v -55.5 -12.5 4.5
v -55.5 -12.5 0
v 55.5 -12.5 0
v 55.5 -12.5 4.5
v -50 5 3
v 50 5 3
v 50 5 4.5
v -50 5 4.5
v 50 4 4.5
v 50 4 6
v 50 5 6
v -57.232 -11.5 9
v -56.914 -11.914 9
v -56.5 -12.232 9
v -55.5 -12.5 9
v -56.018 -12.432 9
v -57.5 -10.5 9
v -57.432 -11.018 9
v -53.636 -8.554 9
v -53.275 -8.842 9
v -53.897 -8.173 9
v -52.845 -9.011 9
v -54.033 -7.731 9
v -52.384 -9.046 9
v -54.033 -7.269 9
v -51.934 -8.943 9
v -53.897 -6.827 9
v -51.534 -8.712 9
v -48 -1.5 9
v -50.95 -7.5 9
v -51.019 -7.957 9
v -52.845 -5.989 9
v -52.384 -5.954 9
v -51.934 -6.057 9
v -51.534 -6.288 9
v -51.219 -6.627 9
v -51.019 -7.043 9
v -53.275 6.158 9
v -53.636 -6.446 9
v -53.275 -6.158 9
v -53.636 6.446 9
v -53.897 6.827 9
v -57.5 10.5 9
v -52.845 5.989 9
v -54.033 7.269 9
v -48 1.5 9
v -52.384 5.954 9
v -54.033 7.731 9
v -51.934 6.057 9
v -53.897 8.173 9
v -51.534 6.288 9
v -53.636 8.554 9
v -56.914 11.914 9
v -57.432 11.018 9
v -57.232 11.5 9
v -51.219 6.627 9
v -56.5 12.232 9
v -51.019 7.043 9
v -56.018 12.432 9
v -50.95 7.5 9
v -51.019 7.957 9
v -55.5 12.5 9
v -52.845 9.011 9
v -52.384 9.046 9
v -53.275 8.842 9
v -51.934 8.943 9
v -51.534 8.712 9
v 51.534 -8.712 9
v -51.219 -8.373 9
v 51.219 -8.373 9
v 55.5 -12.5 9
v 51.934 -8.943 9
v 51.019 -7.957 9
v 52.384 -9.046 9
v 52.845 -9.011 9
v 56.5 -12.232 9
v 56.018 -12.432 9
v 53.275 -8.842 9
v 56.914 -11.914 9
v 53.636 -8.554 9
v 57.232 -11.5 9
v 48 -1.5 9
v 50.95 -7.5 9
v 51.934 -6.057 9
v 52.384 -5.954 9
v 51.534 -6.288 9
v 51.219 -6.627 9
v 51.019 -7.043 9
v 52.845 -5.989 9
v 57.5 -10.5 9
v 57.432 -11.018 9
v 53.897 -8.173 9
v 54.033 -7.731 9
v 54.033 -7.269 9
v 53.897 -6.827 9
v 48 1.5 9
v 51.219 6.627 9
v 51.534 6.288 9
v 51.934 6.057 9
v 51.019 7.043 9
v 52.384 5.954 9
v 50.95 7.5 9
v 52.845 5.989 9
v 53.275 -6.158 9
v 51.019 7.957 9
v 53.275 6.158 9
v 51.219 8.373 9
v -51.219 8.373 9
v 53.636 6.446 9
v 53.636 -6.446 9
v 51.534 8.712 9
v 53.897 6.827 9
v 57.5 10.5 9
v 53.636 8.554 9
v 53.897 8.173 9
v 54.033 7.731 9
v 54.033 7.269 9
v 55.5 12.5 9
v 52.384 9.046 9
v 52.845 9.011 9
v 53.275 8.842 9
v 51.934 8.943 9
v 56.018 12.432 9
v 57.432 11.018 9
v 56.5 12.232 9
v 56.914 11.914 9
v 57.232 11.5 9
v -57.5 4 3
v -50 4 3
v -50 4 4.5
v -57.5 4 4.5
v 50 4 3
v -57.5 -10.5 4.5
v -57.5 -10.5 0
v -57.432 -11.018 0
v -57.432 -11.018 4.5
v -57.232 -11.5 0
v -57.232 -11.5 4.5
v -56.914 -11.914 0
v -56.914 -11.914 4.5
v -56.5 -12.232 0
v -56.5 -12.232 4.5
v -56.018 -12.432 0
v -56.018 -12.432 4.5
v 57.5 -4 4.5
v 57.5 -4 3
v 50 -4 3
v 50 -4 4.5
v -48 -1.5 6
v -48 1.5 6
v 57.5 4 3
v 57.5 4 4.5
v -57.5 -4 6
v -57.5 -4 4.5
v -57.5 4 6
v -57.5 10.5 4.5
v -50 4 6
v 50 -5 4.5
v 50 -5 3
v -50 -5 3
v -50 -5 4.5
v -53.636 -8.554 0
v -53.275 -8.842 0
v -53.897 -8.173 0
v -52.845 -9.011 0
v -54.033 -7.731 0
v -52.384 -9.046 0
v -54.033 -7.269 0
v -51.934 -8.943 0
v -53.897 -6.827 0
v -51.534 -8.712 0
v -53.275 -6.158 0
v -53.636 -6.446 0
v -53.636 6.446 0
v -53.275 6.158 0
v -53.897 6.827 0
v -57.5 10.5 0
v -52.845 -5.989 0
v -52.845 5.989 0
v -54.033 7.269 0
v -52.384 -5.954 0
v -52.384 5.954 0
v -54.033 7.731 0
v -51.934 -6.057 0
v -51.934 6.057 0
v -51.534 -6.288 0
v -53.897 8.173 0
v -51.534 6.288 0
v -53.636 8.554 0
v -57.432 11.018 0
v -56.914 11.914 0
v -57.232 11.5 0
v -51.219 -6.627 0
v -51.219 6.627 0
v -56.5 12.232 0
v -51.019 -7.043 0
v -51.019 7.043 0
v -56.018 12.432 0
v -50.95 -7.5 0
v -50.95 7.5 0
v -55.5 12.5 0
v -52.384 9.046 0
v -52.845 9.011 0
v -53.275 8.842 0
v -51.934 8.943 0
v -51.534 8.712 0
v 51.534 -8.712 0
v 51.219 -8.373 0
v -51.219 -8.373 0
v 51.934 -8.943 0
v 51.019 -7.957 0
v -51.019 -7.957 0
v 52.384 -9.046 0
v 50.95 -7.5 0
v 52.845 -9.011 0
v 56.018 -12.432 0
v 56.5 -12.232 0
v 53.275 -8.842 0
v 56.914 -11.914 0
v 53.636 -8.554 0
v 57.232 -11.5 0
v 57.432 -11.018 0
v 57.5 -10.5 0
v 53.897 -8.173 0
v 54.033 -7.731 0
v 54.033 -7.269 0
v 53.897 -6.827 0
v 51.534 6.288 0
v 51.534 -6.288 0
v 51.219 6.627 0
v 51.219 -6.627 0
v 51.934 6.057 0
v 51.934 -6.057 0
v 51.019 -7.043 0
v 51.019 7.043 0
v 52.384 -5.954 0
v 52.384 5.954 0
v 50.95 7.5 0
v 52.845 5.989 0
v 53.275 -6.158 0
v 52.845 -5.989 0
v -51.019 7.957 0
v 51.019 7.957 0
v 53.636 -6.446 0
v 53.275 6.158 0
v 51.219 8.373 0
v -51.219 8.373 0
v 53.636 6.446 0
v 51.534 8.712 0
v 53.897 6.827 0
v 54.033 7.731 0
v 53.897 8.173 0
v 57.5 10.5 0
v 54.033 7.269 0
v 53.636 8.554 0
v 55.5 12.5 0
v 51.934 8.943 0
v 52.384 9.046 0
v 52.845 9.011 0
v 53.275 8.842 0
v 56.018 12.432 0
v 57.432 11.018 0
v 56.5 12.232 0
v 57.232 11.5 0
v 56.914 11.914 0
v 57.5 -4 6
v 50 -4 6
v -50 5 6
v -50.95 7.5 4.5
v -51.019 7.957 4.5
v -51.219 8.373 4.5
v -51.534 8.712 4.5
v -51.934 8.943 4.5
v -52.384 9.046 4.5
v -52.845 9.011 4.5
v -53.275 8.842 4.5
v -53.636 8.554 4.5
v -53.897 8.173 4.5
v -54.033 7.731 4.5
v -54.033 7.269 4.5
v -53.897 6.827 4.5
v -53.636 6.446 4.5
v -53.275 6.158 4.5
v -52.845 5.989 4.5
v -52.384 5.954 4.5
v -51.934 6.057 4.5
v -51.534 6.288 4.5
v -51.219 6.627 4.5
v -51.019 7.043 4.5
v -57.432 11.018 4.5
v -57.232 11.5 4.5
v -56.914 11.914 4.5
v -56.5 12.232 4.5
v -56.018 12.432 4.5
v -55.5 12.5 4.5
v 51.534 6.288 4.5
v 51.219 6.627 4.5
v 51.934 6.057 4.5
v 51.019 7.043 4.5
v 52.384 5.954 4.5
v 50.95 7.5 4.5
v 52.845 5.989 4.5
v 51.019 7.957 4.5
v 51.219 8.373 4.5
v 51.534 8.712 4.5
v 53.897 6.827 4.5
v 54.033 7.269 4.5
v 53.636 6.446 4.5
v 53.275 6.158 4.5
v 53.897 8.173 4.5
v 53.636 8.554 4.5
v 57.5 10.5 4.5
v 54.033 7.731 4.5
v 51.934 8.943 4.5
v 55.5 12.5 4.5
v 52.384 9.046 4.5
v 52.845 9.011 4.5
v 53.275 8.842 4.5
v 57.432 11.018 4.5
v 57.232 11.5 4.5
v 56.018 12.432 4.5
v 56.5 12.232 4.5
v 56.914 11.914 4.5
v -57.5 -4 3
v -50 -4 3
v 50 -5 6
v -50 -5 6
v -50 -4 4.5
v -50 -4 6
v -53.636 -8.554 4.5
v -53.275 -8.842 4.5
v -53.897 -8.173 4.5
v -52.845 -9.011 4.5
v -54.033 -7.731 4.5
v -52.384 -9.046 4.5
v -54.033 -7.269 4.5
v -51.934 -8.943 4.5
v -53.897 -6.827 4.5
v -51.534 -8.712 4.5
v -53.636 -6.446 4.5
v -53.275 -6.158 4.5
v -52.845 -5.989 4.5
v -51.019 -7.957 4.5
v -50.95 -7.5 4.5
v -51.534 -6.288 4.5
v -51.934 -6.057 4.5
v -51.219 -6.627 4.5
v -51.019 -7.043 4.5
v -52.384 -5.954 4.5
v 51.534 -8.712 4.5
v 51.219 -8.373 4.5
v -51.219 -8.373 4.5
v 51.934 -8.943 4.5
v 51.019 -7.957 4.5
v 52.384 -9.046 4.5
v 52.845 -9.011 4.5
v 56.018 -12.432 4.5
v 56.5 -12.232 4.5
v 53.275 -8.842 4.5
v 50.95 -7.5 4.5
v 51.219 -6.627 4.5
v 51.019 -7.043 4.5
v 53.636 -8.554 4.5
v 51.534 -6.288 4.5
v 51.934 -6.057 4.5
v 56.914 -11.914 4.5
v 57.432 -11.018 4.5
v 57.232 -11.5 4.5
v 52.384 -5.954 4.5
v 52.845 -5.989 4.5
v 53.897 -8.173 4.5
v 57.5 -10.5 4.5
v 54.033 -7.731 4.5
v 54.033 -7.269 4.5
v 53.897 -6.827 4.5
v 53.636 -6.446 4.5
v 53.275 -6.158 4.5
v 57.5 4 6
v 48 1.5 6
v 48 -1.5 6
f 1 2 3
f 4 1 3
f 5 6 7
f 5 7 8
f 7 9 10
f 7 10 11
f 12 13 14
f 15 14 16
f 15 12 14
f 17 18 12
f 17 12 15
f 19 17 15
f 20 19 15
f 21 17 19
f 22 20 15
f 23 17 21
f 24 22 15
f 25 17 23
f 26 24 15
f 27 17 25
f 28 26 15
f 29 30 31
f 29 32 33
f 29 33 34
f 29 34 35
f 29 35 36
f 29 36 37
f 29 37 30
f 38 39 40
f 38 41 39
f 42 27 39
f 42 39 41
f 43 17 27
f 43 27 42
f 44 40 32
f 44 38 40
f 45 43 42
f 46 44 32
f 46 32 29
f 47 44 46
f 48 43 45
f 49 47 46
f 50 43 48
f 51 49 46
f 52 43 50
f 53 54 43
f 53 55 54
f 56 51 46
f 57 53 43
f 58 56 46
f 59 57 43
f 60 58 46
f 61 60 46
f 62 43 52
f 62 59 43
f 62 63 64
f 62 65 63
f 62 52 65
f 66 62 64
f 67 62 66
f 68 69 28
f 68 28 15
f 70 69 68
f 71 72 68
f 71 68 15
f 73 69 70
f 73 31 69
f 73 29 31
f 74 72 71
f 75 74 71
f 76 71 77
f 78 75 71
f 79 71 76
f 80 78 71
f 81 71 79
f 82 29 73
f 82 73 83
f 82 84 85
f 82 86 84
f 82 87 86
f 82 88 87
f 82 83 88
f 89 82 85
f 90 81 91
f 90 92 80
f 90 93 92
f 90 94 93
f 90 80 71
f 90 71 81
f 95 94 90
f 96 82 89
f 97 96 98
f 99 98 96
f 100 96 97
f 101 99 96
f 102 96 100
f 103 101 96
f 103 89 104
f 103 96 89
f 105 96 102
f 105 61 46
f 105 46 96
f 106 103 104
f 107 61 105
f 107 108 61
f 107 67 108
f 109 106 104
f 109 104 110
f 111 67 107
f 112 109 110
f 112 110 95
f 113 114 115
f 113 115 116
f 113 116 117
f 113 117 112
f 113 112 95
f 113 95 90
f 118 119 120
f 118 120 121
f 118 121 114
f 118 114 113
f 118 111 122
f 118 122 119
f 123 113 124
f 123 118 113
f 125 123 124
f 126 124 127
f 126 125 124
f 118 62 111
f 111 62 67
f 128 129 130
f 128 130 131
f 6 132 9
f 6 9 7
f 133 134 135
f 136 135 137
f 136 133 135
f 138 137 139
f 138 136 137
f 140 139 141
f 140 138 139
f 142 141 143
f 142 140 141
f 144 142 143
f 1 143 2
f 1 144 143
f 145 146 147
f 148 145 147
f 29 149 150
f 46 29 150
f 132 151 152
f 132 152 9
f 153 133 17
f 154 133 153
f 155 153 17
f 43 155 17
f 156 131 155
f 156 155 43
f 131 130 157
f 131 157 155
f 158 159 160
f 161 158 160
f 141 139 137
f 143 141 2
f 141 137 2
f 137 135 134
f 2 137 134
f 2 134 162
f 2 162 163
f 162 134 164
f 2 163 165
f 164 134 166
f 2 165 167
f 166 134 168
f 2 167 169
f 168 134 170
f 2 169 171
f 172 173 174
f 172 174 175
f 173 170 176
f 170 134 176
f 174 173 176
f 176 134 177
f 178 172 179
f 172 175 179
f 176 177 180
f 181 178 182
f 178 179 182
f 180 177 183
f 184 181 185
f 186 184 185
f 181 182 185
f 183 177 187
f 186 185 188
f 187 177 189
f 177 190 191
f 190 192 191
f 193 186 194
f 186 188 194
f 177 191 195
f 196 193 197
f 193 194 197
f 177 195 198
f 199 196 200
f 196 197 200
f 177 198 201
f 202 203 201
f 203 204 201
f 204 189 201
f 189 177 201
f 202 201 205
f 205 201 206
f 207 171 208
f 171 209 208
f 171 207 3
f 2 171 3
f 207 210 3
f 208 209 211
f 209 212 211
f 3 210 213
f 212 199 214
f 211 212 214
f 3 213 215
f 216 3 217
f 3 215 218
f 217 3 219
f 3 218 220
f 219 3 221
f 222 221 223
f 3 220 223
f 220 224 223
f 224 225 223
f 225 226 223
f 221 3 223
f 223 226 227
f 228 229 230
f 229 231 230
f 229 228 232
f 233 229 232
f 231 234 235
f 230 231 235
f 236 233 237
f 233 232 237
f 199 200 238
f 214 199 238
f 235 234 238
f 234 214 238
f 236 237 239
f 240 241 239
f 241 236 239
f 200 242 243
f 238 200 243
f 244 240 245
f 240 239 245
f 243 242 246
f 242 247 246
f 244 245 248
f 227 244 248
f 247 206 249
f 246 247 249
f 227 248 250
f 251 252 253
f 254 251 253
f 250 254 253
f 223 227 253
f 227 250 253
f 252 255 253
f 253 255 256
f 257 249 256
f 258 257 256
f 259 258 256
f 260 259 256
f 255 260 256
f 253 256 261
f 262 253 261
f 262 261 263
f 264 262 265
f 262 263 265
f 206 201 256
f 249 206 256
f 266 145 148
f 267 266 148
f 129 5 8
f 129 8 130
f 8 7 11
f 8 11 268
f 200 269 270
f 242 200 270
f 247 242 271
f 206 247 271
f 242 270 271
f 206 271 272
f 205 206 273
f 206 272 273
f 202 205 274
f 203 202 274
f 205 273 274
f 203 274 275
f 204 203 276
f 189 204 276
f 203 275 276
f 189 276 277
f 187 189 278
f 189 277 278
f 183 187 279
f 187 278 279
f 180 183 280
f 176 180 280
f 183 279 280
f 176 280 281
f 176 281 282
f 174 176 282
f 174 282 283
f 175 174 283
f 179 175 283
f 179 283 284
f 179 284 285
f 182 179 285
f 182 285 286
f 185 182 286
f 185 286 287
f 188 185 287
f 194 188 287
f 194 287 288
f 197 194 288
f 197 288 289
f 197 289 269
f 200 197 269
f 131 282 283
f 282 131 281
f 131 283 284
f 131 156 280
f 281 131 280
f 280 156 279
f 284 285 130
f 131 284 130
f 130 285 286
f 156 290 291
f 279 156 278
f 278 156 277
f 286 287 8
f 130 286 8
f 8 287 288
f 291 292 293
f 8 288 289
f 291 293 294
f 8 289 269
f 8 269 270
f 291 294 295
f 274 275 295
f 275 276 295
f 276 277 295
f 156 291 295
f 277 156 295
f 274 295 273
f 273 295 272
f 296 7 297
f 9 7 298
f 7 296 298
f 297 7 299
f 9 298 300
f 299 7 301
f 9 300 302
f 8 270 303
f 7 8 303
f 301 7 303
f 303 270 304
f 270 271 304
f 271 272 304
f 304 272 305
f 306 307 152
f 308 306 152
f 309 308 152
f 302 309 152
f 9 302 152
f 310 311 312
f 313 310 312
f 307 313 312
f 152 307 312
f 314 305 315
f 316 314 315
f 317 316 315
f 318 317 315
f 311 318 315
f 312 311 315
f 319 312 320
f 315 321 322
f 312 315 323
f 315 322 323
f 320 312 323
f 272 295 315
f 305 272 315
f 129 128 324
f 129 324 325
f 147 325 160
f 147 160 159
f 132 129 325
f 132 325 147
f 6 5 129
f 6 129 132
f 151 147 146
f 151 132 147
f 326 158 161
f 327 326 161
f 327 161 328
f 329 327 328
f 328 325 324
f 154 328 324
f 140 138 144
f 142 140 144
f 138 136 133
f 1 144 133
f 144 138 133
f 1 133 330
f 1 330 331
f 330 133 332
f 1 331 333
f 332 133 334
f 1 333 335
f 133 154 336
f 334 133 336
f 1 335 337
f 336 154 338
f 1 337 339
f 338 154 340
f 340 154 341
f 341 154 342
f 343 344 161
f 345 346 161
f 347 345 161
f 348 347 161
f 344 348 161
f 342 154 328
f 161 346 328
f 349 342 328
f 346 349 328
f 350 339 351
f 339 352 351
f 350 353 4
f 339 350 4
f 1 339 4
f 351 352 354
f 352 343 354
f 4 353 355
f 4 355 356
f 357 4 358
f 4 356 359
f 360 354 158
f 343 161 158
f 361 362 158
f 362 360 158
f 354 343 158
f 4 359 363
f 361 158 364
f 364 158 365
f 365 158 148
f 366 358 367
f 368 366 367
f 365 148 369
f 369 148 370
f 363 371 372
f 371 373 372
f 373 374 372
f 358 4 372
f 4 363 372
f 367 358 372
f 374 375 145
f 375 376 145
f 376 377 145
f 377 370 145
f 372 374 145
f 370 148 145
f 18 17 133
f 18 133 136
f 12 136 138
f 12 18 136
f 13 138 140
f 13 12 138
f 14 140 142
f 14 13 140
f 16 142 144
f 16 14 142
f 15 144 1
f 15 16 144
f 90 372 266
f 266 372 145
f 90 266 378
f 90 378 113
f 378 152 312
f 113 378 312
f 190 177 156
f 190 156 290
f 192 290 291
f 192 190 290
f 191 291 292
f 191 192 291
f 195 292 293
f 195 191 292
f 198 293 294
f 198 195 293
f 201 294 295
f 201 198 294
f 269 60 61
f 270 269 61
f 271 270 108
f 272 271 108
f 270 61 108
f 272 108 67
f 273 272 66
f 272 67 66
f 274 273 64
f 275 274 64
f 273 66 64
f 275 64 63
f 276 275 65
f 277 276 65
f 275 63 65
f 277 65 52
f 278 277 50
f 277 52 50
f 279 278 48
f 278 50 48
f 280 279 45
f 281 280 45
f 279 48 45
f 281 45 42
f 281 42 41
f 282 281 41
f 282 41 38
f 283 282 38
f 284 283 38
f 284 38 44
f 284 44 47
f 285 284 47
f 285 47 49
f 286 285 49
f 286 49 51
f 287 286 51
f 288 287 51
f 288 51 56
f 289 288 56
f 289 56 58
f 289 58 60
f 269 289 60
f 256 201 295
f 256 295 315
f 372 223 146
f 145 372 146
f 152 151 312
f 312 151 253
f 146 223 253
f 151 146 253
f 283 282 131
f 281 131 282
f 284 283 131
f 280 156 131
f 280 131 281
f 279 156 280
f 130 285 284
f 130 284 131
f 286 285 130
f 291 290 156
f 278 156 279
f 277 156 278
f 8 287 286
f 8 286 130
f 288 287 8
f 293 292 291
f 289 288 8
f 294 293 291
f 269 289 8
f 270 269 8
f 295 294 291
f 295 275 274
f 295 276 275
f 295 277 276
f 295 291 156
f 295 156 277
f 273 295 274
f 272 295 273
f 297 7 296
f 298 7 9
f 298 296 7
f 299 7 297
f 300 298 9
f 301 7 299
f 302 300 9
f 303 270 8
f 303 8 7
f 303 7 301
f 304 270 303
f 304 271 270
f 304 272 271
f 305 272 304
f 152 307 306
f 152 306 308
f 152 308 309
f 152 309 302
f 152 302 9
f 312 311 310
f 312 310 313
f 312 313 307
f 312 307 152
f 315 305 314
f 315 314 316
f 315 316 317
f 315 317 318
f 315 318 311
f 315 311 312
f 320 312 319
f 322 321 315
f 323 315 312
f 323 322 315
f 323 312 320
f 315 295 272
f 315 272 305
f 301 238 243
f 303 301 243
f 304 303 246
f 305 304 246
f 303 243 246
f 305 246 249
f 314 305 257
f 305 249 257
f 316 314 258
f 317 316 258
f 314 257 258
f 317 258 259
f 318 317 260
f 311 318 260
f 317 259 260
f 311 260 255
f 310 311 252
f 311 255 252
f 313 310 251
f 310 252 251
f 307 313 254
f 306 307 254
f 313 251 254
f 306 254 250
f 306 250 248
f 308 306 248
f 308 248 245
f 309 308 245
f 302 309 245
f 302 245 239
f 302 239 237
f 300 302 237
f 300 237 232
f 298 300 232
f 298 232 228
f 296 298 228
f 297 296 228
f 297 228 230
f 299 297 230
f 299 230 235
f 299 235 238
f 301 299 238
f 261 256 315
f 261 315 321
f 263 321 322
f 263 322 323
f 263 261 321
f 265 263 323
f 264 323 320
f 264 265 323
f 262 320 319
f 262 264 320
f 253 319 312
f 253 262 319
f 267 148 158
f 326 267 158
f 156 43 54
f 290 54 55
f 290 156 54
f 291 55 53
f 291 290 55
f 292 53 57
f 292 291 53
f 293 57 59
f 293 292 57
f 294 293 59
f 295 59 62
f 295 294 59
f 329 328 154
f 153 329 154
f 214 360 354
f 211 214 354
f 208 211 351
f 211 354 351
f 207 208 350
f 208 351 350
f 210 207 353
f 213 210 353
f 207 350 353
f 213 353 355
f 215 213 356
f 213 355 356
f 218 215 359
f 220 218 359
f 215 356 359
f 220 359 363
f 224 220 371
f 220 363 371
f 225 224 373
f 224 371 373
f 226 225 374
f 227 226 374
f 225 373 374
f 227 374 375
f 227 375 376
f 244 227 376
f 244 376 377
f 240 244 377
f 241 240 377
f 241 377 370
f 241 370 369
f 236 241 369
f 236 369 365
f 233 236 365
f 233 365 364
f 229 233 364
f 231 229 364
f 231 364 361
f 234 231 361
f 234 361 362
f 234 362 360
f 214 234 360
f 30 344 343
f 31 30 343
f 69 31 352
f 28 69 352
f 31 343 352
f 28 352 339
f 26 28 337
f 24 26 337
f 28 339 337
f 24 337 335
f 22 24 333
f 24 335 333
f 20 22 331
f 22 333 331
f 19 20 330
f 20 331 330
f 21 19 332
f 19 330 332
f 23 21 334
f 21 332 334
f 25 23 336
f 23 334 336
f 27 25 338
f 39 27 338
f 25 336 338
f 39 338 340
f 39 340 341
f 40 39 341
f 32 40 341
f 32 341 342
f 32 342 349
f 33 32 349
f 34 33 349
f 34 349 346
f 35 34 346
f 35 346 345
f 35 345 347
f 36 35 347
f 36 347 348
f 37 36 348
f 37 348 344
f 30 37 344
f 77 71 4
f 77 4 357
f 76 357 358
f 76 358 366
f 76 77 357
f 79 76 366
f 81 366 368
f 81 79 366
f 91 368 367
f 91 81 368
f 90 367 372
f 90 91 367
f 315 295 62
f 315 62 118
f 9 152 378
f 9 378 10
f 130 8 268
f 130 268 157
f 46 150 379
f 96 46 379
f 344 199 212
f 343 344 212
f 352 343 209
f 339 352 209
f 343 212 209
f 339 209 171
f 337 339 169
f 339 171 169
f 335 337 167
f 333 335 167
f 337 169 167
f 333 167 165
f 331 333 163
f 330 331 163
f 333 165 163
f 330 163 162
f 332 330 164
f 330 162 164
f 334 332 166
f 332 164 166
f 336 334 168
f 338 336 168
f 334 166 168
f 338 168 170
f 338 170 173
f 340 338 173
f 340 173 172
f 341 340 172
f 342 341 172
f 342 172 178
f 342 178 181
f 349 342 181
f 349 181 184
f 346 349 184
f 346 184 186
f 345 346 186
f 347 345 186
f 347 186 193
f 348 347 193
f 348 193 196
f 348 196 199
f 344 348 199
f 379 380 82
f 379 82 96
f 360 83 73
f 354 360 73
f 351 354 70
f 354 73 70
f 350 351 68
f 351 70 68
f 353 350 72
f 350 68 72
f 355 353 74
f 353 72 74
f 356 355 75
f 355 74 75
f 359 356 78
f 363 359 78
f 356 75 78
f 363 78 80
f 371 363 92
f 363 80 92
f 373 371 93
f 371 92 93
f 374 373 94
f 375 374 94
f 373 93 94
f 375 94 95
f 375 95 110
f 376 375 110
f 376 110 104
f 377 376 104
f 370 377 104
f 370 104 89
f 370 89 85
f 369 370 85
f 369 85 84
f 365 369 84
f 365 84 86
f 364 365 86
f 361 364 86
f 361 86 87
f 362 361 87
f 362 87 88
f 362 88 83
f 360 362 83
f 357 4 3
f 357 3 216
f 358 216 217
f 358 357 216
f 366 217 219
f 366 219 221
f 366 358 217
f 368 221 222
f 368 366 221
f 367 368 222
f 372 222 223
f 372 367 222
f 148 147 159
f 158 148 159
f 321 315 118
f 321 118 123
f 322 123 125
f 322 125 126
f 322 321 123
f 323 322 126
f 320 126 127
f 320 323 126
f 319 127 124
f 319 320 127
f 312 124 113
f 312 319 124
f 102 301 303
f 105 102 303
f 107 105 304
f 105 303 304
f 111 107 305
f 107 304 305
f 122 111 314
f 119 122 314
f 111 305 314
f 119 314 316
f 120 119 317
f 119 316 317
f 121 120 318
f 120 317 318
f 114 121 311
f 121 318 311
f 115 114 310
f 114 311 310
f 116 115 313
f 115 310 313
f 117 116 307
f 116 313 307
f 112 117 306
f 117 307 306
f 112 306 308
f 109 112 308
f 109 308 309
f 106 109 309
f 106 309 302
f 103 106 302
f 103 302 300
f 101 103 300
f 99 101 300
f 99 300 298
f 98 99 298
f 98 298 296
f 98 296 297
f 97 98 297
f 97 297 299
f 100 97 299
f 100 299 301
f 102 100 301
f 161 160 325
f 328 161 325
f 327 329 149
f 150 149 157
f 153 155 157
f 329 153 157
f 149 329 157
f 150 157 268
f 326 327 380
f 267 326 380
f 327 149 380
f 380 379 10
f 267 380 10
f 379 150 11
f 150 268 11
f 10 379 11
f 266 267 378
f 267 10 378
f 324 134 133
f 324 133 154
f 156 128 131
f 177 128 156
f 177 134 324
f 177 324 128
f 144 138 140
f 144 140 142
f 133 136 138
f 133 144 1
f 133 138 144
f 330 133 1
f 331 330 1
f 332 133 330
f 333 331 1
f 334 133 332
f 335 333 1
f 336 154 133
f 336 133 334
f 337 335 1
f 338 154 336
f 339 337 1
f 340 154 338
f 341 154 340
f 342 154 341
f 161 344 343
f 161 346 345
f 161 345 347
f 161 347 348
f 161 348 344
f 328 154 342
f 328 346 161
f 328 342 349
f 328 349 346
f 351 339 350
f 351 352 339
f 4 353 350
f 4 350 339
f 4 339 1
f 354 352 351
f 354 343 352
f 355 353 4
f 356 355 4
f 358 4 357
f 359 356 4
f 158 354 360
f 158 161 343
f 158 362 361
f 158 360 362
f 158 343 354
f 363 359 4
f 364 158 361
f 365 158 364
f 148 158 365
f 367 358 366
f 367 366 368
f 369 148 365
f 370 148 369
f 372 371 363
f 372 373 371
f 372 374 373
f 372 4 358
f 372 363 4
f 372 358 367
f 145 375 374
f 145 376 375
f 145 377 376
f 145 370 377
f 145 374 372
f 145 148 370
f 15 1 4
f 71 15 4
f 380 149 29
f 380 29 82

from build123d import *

# Parameters (mm, degrees)
BOX_BOTTOM_HALF_0_W     = 117
BOX_BOTTOM_HALF_0_H     = 27
BOX_BOTTOM_HALF_0_DEPTH = 5.5
SKETCH_W                = 115
SKETCH_H                = 25
PAD_DEPTH               = 3
PAD001_DEPTH            = 3
SKETCH002_W             = 115
SKETCH002_H             = 25
SKETCH002_W_2           = 96
SKETCH002_H_2           = 3
PAD002_DEPTH            = 3
SKETCH003_R             = 1.55
POCKET_DEPTH            = 245.060315
POLARPATTERN_COUNT      = 2
POLARPATTERN001_COUNT   = 2
POLARPATTERN002_COUNT   = 2
FILLET_R                = 2


with BuildPart() as box_bottom_half_0_body:
    # box_bottom_half_0 → box_bottom_half_0 (new body)
    with BuildSketch(Plane(origin=(-58.5, -13.5, -1), x_dir=(1, 0, 0), z_dir=(0, 0, 1))):
        with Locations((58.5, 13.5)):
            Rectangle(BOX_BOTTOM_HALF_0_W, BOX_BOTTOM_HALF_0_H)
    extrude(amount=BOX_BOTTOM_HALF_0_DEPTH)


with BuildPart() as body:
    # Sketch → Pad (new body)
    with BuildSketch(Plane.XY):
        Rectangle(SKETCH_W, SKETCH_H)
    extrude(amount=PAD_DEPTH)

    # Sketch001 (on Face6 of Pad) → Pad001 (join)
    with BuildSketch(Plane.XY.offset(3)):
        Polygon((-57.5, 12.5), (57.5, 12.5), (57.5, 4), (50, 4), (50, 5), (-50, 5), (-50, 4), (-57.5, 4), align=None)
        Polygon((-57.5, -12.5), (57.5, -12.5), (57.5, -4), (50, -4), (50, -5), (-50, -5), (-50, -4), (-57.5, -4), align=None)
    extrude(amount=PAD001_DEPTH)

    # Sketch002 (on Face12 of Pad001) → Pad002 (join)
    with BuildSketch(Plane.XY.offset(6)):
        Rectangle(SKETCH002_W, SKETCH002_H)
        Rectangle(SKETCH002_W_2, SKETCH002_H_2, mode=Mode.SUBTRACT)
    extrude(amount=PAD002_DEPTH)

    # Sketch003 (on Face26 of Pad002) → Pocket (cut, through all)
    with BuildSketch(Plane.XY.offset(9)):
        with Locations((-52.5, 7.5)):
            Circle(SKETCH003_R)
    pocket = extrude(amount=-POCKET_DEPTH, mode=Mode.SUBTRACT)

    # PolarPattern: Pocket ×2 about axis
    polarpattern_axis = Axis((0, 0, 0), (0, 1, 0))
    for i in range(1, POLARPATTERN_COUNT):
        add(pocket.rotate(polarpattern_axis, i * 360 / POLARPATTERN_COUNT), mode=Mode.SUBTRACT)

    # PolarPattern001: Pocket ×2 about axis
    polarpattern001_axis = Axis((0, 0, 0), (1, 0, 0))
    for i in range(1, POLARPATTERN001_COUNT):
        add(pocket.rotate(polarpattern001_axis, i * 360 / POLARPATTERN001_COUNT), mode=Mode.SUBTRACT)

    # PolarPattern002: Pocket ×2 about axis
    polarpattern002_axis = Axis((0, 0, 9), (0, 0, 1))
    for i in range(1, POLARPATTERN002_COUNT):
        add(pocket.rotate(polarpattern002_axis, i * 360 / POLARPATTERN002_COUNT), mode=Mode.SUBTRACT)

    # Fillet
    fillet_edges = [body.edges().sort_by_distance(p)[0] for p in [
        (57.5, 12.5, 7.5),
        (57.5, 12.5, 4.5),
        (57.5, 12.5, 1.5),
        (57.5, -12.5, 7.5),
        (-57.5, 12.5, 7.5),
        (-57.5, -12.5, 7.5),
    ]]
    fillet(fillet_edges, radius=FILLET_R)


with BuildPart() as bottom_half_0_body:
    # bottom_half_0 base: copy of Body
    add(body.part)

    # bottom_half_0: intersect box_bottom_half_0 body
    add(box_bottom_half_0_body.part, mode=Mode.INTERSECT)


with BuildPart() as top_half_0_body:
    # top_half_0 base: copy of Body
    add(body.part)

    # top_half_0: cut box_bottom_half_0 body
    add(box_bottom_half_0_body.part, mode=Mode.SUBTRACT)


solid = Compound([bottom_half_0_body.part, top_half_0_body.part])
